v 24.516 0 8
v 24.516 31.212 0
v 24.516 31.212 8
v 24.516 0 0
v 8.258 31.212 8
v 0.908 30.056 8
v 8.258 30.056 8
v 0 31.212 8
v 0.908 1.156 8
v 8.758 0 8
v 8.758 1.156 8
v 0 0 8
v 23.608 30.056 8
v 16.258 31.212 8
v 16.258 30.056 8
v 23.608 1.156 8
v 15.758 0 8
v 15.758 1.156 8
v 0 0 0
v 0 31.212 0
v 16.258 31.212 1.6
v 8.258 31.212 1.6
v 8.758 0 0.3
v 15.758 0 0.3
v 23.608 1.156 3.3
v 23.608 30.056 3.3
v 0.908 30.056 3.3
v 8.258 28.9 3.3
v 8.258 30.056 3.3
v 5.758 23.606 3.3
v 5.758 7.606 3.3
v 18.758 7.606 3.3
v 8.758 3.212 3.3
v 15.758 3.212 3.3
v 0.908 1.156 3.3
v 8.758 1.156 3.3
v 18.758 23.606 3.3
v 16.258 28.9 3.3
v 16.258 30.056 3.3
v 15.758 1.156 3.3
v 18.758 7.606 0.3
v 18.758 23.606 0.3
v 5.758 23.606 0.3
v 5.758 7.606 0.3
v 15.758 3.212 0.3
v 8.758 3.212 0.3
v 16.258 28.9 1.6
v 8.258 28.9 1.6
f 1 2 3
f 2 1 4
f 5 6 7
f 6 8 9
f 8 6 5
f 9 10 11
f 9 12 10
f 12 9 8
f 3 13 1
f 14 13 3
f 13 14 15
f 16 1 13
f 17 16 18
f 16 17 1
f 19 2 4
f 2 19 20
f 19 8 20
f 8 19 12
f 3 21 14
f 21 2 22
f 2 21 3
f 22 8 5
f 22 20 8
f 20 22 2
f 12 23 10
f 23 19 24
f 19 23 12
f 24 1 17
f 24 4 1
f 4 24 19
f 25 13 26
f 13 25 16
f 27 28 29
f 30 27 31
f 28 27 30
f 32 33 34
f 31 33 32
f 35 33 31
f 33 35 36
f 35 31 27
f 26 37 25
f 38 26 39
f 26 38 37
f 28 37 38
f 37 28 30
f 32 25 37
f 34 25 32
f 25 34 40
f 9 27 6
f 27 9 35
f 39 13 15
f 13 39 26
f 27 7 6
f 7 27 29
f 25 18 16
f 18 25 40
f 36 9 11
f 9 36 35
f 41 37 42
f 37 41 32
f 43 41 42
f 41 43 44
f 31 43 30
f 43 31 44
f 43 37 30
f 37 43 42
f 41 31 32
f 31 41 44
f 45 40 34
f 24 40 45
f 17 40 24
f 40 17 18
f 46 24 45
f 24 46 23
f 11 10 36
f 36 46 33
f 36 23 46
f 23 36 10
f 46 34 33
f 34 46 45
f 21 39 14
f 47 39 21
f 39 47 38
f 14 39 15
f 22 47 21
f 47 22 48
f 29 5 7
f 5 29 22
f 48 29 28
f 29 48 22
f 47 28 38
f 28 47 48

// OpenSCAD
//21.55x28.01
w=22.7;
h=28.9;
z=8;
rim=0.08;
text="ftl";
fontsize=10;

difference() {
 cube([w*(1+rim),h*(1+rim),z]);
 translate([w*rim/2,h*rim/2,3.3]){
  cube([w,h,z]);
 }    

// seat
 seatw=13;
 seath=16;
 translate([(w*(1+rim)/2)-(seatw/2),(h*(1+rim)/2)-(seath/2),0.3]){
  cube([seatw,seath,z]);
 }    
 
 //side door
 //translate([-0.01,h/1.8,0.3]){
 // cube([(w*rim),(h*rim*2)+1,z]);
 //}    
 
 // neoport
 neoport=7;
 translate([(w*(1+rim)/2)-(neoport/2),-0.1,0.3]){
  cube([neoport,(h*rim)+1,z]);
 }    

 // usb port
 usb_width=8;
 translate([(w*(1+rim)/2)-(usb_width/2),h,z*0.2]){
  cube([usb_width,(h*rim)+1,z]);
 }    
}

// text
//translate([w/3,2,0]) {
//    linear_extrude(height = 1) {
//      text(text, size = fontsize, font = "Verdana");
//    }
//}
